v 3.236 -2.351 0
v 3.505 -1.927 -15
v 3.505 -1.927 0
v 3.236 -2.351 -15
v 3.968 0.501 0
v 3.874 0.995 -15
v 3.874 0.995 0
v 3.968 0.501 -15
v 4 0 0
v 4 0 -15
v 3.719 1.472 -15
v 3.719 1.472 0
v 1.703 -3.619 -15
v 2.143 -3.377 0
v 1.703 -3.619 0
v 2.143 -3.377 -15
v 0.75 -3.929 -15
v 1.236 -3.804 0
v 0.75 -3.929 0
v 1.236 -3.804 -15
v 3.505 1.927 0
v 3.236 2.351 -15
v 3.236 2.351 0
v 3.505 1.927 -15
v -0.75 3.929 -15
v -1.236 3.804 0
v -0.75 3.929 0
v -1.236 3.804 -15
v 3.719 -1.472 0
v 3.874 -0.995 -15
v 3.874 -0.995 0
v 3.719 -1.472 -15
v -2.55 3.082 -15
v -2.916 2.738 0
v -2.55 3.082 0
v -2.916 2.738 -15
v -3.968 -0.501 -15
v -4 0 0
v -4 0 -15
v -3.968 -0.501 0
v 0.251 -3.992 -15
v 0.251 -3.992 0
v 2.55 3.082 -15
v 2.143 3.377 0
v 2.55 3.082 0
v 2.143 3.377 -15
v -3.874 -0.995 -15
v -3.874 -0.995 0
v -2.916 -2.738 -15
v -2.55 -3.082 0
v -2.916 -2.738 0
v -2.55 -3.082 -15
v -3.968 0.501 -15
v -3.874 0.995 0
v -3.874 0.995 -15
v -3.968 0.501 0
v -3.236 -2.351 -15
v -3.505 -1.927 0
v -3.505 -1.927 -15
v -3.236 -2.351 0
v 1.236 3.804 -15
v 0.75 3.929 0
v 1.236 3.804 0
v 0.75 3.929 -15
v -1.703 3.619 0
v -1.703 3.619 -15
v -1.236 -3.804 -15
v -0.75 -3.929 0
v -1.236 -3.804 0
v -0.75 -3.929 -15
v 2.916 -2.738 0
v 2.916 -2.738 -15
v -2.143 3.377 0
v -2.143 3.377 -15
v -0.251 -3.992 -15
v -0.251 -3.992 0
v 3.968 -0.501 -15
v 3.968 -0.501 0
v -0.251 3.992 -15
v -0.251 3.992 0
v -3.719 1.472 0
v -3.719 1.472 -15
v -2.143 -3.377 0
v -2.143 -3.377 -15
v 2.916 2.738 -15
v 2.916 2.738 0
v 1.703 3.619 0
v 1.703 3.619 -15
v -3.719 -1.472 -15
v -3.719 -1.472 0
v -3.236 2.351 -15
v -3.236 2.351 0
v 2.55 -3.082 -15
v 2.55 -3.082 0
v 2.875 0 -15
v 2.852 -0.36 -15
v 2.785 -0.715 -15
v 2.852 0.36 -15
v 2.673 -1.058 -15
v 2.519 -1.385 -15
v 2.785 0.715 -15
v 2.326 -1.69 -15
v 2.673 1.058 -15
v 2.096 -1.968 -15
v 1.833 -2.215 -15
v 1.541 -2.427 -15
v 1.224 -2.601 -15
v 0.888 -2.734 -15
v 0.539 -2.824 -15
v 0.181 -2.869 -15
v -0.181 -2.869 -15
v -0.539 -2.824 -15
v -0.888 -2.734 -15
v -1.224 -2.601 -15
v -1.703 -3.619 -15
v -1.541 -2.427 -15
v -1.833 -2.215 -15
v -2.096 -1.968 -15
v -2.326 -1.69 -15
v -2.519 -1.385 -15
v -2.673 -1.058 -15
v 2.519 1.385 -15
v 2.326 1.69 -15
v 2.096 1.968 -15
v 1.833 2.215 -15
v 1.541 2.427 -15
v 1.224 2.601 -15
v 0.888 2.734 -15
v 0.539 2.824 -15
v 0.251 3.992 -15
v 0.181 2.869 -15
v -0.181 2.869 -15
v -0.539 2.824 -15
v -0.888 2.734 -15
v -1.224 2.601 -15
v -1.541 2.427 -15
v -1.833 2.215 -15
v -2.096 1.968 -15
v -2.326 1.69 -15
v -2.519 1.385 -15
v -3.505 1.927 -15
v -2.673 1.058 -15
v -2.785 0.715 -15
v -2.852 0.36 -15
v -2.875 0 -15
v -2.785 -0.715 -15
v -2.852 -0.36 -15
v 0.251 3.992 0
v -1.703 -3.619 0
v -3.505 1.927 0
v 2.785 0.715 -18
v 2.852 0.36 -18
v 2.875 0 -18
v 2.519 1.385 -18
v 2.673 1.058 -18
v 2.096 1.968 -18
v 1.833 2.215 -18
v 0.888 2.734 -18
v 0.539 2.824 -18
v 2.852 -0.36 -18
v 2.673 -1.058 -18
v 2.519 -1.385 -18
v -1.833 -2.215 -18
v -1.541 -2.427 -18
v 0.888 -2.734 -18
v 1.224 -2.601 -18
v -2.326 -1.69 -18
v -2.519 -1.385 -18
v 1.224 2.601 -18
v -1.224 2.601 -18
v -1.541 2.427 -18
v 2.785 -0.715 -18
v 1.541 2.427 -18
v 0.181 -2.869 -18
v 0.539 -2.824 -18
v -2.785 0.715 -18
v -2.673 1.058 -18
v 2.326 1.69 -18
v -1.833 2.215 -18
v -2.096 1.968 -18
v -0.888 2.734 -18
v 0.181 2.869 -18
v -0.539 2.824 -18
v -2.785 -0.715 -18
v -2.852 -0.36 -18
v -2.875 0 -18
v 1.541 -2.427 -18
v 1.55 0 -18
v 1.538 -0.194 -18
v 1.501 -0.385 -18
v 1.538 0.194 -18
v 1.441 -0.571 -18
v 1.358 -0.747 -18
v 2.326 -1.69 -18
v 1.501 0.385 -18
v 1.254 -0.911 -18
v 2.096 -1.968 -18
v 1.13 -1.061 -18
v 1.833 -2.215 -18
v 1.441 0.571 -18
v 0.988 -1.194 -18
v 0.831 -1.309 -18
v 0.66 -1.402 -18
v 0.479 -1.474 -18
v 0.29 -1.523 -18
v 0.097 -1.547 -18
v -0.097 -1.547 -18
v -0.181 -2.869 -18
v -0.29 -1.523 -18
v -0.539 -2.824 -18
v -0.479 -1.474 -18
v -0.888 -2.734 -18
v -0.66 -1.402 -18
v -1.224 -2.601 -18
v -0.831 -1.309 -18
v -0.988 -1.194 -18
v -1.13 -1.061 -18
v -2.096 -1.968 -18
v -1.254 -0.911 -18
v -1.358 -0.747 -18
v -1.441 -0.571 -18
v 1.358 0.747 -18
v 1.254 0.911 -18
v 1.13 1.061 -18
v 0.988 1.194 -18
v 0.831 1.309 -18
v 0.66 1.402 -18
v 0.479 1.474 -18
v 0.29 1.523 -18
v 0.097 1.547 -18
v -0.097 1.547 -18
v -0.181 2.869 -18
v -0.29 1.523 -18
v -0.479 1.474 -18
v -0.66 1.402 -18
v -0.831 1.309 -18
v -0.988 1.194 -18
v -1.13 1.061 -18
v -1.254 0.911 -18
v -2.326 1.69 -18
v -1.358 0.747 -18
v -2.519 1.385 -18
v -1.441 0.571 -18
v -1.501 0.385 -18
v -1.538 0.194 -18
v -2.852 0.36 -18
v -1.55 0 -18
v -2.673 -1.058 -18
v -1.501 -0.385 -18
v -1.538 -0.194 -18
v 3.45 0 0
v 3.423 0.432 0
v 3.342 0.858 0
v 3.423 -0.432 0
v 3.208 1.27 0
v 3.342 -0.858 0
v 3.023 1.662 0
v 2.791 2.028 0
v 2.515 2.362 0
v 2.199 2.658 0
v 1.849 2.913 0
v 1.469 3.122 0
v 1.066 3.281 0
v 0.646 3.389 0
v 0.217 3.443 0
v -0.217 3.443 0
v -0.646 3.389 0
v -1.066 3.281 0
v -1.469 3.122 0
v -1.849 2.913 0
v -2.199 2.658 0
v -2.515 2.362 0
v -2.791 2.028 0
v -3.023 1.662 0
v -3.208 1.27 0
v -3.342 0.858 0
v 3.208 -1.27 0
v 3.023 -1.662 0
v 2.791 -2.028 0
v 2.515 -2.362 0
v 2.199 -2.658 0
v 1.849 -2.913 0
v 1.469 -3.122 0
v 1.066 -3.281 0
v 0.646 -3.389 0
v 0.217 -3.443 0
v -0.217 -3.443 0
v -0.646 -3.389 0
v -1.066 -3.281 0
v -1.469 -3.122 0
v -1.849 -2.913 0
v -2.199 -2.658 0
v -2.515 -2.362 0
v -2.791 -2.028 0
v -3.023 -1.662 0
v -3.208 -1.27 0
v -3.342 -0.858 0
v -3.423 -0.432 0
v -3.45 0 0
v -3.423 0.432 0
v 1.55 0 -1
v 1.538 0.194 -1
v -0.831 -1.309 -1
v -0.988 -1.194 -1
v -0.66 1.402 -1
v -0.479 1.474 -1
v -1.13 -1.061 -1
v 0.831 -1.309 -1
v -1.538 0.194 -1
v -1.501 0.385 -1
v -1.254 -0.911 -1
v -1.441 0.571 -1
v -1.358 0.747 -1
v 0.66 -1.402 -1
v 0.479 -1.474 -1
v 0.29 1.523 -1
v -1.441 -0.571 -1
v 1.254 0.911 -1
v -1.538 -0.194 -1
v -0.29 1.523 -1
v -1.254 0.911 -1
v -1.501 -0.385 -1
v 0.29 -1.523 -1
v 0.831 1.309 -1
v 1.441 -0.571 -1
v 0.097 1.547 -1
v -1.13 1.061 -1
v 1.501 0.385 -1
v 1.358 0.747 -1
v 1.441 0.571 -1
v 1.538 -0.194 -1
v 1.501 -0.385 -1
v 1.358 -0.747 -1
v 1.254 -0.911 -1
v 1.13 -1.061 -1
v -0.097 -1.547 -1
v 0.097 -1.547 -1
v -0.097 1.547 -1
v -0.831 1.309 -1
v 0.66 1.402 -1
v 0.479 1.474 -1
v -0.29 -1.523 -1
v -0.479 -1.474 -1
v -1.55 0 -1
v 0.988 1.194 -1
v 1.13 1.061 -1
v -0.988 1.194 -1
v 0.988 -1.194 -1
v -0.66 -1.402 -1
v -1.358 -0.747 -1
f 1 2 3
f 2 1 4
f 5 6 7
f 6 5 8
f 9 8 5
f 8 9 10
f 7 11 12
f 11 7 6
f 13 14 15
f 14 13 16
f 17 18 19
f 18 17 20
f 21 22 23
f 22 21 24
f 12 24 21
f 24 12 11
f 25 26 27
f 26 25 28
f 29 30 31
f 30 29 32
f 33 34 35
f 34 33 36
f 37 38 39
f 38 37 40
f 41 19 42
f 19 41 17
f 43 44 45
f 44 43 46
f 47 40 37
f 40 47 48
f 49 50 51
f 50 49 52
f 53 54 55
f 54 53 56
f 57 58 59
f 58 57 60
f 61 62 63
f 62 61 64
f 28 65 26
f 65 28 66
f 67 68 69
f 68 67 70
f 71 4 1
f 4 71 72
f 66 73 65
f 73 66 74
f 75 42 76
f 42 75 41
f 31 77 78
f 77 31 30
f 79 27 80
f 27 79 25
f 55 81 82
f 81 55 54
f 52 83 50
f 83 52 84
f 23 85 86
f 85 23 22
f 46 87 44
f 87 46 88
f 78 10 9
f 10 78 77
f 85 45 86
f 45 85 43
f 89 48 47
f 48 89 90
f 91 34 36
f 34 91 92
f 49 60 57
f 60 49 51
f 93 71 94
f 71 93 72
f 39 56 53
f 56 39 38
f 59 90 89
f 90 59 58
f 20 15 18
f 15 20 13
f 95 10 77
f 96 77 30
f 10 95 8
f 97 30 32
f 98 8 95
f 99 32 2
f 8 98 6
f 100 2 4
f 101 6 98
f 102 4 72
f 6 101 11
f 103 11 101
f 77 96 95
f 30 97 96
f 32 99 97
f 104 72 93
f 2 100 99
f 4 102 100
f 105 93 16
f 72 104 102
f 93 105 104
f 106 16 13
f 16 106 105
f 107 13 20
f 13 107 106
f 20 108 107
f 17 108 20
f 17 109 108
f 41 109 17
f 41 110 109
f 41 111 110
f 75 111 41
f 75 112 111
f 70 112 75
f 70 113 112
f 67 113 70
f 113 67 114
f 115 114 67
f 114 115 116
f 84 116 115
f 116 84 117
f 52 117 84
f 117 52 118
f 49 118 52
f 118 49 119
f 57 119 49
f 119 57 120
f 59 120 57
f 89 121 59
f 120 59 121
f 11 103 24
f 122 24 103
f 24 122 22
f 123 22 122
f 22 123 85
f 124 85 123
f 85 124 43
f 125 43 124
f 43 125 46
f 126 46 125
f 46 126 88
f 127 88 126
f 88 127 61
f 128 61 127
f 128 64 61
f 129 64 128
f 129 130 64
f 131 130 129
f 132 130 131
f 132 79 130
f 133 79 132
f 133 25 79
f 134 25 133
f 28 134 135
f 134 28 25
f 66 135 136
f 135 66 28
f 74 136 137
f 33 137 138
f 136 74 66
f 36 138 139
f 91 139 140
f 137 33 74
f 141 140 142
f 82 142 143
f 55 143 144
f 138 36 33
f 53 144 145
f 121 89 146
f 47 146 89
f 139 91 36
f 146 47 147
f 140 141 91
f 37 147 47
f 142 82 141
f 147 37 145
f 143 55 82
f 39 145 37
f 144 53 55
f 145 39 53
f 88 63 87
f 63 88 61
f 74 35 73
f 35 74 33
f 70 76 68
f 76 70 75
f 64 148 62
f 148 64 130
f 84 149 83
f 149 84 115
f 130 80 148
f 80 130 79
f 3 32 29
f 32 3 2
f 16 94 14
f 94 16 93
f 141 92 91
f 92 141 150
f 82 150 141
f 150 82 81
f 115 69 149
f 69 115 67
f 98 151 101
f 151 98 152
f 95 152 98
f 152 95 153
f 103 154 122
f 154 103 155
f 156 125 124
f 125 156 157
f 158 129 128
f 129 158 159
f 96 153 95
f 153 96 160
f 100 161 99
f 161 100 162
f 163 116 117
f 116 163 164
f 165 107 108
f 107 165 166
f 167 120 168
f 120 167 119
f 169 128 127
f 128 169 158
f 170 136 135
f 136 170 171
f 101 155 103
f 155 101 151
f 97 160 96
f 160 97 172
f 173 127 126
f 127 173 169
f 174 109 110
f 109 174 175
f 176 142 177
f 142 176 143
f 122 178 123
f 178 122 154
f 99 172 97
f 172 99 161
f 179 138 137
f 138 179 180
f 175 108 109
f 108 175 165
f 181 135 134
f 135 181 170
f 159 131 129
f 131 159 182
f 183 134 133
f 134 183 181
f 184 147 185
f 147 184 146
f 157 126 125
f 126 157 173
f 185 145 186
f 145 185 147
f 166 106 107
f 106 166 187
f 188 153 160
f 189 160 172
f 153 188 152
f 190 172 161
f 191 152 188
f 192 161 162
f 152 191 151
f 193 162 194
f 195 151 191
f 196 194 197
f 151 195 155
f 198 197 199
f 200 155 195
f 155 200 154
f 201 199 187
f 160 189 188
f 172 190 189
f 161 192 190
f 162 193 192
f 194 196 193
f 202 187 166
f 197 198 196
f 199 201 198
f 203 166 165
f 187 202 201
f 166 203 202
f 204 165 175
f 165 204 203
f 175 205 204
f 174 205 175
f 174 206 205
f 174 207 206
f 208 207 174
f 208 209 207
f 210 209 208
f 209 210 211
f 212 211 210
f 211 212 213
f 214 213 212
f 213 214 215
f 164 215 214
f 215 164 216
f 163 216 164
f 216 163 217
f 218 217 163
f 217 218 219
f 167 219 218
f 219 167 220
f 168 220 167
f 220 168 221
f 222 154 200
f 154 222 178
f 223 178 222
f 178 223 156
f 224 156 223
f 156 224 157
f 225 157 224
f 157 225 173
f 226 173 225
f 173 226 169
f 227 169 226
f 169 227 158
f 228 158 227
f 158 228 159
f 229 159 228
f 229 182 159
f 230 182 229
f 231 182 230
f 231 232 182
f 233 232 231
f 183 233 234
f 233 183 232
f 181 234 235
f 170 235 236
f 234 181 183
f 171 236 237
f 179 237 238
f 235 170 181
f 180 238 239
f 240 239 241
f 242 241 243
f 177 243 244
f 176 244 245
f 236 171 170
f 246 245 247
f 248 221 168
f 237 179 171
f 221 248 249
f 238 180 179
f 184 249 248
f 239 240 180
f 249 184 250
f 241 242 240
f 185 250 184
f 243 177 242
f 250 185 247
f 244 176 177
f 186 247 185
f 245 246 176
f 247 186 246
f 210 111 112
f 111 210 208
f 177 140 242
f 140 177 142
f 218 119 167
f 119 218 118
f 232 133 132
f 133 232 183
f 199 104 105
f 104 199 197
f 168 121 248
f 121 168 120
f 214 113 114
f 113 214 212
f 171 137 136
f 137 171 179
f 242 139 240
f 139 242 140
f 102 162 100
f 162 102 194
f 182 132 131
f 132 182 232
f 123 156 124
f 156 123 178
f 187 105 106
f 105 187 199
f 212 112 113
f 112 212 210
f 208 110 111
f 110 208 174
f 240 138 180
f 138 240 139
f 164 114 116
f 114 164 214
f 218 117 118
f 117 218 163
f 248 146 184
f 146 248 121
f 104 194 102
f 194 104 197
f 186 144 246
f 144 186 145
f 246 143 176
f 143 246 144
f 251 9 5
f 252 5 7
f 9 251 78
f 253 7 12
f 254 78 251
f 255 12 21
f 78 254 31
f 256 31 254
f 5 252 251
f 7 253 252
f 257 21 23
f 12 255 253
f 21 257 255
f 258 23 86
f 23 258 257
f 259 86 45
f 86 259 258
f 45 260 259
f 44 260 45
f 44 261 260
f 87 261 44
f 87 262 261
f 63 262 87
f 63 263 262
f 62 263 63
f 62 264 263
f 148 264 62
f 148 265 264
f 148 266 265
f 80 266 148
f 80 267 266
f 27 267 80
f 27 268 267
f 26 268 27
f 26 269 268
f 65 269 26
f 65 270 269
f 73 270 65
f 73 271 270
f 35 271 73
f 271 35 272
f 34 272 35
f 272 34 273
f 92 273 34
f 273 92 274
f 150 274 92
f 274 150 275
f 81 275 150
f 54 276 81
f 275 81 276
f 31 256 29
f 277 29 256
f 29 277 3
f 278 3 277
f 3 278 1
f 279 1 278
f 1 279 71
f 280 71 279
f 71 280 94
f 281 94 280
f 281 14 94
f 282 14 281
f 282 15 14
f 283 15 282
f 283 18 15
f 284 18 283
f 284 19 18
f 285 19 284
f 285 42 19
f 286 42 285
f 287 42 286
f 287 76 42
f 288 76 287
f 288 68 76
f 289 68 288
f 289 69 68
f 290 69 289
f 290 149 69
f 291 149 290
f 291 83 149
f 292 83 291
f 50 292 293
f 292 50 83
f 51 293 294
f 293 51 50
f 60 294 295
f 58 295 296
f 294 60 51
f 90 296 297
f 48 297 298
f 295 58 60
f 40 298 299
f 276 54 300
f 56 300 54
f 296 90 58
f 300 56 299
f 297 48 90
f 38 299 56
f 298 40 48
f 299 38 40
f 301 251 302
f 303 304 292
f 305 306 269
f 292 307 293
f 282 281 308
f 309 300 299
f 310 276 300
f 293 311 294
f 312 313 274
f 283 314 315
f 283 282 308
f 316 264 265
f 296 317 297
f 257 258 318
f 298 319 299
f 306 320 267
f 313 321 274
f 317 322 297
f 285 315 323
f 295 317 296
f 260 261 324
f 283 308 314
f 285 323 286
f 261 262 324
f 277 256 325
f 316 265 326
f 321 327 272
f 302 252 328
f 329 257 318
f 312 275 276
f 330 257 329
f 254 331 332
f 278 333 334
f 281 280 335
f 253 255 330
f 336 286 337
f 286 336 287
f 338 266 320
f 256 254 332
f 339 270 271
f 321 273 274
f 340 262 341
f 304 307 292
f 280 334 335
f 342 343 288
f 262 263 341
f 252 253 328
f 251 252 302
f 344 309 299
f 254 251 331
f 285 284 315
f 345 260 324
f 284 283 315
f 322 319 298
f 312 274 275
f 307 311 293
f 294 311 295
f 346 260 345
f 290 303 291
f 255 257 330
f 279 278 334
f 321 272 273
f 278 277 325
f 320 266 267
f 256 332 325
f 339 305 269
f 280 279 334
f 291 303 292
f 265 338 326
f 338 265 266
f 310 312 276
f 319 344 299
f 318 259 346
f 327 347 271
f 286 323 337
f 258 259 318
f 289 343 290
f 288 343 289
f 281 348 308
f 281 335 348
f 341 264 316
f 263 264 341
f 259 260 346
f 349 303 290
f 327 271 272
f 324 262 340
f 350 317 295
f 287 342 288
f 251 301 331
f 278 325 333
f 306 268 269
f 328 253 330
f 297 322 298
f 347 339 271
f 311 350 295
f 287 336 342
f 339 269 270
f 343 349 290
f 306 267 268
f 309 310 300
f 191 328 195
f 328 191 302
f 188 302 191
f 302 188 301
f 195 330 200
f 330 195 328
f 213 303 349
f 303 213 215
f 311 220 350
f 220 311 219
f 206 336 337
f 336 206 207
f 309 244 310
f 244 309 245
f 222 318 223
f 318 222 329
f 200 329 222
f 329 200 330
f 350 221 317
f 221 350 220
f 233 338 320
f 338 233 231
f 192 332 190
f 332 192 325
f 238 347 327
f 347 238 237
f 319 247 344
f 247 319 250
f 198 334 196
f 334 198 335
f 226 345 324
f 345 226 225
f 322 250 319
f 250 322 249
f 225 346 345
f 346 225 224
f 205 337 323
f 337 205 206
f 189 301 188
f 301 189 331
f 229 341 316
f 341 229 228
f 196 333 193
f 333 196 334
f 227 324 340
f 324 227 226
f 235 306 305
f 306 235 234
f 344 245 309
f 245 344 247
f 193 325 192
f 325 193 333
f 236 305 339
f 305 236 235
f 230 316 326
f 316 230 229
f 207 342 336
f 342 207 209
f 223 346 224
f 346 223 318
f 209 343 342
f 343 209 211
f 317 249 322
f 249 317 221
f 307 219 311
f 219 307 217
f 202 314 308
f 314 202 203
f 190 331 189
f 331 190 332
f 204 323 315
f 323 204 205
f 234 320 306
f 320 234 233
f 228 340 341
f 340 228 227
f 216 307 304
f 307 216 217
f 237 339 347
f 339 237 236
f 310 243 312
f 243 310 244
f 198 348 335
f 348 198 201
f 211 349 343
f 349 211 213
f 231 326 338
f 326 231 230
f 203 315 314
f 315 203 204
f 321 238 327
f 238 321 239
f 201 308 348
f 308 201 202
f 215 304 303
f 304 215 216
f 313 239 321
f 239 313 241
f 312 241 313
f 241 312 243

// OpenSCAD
$fn = 50;

difference() {
	union() {
		translate(v = [0, 0, -15.0]) {
			cylinder(h = 18, r = 4.0);
		}
		#translate(v = [0, 0, -18.0]) {
			cylinder(h = 18, r = 2.875);
		}
	}
	union() {
		translate(v = [0, 0, 0]) {
			rotate(a = [0, 0, 0]) {
				difference() {
					union() {
						translate(v = [0, 0, -18.0]) {
							cylinder(h = 18, r = 1.25);
						}
						translate(v = [0, 0, -1.0]) {
							cylinder(h = 1.0, r1 = 1.55, r2 = 3.45);
						}
						translate(v = [0, 0, -18.0]) {
							cylinder(h = 18, r = 1.55);
						}
						translate(v = [0, 0, -18.0]) {
							cylinder(h = 18, r = 1.25);
						}
					}
					union();
				}
			}
		}
		#cylinder(h = 3, r = 5.0);
	}
}
